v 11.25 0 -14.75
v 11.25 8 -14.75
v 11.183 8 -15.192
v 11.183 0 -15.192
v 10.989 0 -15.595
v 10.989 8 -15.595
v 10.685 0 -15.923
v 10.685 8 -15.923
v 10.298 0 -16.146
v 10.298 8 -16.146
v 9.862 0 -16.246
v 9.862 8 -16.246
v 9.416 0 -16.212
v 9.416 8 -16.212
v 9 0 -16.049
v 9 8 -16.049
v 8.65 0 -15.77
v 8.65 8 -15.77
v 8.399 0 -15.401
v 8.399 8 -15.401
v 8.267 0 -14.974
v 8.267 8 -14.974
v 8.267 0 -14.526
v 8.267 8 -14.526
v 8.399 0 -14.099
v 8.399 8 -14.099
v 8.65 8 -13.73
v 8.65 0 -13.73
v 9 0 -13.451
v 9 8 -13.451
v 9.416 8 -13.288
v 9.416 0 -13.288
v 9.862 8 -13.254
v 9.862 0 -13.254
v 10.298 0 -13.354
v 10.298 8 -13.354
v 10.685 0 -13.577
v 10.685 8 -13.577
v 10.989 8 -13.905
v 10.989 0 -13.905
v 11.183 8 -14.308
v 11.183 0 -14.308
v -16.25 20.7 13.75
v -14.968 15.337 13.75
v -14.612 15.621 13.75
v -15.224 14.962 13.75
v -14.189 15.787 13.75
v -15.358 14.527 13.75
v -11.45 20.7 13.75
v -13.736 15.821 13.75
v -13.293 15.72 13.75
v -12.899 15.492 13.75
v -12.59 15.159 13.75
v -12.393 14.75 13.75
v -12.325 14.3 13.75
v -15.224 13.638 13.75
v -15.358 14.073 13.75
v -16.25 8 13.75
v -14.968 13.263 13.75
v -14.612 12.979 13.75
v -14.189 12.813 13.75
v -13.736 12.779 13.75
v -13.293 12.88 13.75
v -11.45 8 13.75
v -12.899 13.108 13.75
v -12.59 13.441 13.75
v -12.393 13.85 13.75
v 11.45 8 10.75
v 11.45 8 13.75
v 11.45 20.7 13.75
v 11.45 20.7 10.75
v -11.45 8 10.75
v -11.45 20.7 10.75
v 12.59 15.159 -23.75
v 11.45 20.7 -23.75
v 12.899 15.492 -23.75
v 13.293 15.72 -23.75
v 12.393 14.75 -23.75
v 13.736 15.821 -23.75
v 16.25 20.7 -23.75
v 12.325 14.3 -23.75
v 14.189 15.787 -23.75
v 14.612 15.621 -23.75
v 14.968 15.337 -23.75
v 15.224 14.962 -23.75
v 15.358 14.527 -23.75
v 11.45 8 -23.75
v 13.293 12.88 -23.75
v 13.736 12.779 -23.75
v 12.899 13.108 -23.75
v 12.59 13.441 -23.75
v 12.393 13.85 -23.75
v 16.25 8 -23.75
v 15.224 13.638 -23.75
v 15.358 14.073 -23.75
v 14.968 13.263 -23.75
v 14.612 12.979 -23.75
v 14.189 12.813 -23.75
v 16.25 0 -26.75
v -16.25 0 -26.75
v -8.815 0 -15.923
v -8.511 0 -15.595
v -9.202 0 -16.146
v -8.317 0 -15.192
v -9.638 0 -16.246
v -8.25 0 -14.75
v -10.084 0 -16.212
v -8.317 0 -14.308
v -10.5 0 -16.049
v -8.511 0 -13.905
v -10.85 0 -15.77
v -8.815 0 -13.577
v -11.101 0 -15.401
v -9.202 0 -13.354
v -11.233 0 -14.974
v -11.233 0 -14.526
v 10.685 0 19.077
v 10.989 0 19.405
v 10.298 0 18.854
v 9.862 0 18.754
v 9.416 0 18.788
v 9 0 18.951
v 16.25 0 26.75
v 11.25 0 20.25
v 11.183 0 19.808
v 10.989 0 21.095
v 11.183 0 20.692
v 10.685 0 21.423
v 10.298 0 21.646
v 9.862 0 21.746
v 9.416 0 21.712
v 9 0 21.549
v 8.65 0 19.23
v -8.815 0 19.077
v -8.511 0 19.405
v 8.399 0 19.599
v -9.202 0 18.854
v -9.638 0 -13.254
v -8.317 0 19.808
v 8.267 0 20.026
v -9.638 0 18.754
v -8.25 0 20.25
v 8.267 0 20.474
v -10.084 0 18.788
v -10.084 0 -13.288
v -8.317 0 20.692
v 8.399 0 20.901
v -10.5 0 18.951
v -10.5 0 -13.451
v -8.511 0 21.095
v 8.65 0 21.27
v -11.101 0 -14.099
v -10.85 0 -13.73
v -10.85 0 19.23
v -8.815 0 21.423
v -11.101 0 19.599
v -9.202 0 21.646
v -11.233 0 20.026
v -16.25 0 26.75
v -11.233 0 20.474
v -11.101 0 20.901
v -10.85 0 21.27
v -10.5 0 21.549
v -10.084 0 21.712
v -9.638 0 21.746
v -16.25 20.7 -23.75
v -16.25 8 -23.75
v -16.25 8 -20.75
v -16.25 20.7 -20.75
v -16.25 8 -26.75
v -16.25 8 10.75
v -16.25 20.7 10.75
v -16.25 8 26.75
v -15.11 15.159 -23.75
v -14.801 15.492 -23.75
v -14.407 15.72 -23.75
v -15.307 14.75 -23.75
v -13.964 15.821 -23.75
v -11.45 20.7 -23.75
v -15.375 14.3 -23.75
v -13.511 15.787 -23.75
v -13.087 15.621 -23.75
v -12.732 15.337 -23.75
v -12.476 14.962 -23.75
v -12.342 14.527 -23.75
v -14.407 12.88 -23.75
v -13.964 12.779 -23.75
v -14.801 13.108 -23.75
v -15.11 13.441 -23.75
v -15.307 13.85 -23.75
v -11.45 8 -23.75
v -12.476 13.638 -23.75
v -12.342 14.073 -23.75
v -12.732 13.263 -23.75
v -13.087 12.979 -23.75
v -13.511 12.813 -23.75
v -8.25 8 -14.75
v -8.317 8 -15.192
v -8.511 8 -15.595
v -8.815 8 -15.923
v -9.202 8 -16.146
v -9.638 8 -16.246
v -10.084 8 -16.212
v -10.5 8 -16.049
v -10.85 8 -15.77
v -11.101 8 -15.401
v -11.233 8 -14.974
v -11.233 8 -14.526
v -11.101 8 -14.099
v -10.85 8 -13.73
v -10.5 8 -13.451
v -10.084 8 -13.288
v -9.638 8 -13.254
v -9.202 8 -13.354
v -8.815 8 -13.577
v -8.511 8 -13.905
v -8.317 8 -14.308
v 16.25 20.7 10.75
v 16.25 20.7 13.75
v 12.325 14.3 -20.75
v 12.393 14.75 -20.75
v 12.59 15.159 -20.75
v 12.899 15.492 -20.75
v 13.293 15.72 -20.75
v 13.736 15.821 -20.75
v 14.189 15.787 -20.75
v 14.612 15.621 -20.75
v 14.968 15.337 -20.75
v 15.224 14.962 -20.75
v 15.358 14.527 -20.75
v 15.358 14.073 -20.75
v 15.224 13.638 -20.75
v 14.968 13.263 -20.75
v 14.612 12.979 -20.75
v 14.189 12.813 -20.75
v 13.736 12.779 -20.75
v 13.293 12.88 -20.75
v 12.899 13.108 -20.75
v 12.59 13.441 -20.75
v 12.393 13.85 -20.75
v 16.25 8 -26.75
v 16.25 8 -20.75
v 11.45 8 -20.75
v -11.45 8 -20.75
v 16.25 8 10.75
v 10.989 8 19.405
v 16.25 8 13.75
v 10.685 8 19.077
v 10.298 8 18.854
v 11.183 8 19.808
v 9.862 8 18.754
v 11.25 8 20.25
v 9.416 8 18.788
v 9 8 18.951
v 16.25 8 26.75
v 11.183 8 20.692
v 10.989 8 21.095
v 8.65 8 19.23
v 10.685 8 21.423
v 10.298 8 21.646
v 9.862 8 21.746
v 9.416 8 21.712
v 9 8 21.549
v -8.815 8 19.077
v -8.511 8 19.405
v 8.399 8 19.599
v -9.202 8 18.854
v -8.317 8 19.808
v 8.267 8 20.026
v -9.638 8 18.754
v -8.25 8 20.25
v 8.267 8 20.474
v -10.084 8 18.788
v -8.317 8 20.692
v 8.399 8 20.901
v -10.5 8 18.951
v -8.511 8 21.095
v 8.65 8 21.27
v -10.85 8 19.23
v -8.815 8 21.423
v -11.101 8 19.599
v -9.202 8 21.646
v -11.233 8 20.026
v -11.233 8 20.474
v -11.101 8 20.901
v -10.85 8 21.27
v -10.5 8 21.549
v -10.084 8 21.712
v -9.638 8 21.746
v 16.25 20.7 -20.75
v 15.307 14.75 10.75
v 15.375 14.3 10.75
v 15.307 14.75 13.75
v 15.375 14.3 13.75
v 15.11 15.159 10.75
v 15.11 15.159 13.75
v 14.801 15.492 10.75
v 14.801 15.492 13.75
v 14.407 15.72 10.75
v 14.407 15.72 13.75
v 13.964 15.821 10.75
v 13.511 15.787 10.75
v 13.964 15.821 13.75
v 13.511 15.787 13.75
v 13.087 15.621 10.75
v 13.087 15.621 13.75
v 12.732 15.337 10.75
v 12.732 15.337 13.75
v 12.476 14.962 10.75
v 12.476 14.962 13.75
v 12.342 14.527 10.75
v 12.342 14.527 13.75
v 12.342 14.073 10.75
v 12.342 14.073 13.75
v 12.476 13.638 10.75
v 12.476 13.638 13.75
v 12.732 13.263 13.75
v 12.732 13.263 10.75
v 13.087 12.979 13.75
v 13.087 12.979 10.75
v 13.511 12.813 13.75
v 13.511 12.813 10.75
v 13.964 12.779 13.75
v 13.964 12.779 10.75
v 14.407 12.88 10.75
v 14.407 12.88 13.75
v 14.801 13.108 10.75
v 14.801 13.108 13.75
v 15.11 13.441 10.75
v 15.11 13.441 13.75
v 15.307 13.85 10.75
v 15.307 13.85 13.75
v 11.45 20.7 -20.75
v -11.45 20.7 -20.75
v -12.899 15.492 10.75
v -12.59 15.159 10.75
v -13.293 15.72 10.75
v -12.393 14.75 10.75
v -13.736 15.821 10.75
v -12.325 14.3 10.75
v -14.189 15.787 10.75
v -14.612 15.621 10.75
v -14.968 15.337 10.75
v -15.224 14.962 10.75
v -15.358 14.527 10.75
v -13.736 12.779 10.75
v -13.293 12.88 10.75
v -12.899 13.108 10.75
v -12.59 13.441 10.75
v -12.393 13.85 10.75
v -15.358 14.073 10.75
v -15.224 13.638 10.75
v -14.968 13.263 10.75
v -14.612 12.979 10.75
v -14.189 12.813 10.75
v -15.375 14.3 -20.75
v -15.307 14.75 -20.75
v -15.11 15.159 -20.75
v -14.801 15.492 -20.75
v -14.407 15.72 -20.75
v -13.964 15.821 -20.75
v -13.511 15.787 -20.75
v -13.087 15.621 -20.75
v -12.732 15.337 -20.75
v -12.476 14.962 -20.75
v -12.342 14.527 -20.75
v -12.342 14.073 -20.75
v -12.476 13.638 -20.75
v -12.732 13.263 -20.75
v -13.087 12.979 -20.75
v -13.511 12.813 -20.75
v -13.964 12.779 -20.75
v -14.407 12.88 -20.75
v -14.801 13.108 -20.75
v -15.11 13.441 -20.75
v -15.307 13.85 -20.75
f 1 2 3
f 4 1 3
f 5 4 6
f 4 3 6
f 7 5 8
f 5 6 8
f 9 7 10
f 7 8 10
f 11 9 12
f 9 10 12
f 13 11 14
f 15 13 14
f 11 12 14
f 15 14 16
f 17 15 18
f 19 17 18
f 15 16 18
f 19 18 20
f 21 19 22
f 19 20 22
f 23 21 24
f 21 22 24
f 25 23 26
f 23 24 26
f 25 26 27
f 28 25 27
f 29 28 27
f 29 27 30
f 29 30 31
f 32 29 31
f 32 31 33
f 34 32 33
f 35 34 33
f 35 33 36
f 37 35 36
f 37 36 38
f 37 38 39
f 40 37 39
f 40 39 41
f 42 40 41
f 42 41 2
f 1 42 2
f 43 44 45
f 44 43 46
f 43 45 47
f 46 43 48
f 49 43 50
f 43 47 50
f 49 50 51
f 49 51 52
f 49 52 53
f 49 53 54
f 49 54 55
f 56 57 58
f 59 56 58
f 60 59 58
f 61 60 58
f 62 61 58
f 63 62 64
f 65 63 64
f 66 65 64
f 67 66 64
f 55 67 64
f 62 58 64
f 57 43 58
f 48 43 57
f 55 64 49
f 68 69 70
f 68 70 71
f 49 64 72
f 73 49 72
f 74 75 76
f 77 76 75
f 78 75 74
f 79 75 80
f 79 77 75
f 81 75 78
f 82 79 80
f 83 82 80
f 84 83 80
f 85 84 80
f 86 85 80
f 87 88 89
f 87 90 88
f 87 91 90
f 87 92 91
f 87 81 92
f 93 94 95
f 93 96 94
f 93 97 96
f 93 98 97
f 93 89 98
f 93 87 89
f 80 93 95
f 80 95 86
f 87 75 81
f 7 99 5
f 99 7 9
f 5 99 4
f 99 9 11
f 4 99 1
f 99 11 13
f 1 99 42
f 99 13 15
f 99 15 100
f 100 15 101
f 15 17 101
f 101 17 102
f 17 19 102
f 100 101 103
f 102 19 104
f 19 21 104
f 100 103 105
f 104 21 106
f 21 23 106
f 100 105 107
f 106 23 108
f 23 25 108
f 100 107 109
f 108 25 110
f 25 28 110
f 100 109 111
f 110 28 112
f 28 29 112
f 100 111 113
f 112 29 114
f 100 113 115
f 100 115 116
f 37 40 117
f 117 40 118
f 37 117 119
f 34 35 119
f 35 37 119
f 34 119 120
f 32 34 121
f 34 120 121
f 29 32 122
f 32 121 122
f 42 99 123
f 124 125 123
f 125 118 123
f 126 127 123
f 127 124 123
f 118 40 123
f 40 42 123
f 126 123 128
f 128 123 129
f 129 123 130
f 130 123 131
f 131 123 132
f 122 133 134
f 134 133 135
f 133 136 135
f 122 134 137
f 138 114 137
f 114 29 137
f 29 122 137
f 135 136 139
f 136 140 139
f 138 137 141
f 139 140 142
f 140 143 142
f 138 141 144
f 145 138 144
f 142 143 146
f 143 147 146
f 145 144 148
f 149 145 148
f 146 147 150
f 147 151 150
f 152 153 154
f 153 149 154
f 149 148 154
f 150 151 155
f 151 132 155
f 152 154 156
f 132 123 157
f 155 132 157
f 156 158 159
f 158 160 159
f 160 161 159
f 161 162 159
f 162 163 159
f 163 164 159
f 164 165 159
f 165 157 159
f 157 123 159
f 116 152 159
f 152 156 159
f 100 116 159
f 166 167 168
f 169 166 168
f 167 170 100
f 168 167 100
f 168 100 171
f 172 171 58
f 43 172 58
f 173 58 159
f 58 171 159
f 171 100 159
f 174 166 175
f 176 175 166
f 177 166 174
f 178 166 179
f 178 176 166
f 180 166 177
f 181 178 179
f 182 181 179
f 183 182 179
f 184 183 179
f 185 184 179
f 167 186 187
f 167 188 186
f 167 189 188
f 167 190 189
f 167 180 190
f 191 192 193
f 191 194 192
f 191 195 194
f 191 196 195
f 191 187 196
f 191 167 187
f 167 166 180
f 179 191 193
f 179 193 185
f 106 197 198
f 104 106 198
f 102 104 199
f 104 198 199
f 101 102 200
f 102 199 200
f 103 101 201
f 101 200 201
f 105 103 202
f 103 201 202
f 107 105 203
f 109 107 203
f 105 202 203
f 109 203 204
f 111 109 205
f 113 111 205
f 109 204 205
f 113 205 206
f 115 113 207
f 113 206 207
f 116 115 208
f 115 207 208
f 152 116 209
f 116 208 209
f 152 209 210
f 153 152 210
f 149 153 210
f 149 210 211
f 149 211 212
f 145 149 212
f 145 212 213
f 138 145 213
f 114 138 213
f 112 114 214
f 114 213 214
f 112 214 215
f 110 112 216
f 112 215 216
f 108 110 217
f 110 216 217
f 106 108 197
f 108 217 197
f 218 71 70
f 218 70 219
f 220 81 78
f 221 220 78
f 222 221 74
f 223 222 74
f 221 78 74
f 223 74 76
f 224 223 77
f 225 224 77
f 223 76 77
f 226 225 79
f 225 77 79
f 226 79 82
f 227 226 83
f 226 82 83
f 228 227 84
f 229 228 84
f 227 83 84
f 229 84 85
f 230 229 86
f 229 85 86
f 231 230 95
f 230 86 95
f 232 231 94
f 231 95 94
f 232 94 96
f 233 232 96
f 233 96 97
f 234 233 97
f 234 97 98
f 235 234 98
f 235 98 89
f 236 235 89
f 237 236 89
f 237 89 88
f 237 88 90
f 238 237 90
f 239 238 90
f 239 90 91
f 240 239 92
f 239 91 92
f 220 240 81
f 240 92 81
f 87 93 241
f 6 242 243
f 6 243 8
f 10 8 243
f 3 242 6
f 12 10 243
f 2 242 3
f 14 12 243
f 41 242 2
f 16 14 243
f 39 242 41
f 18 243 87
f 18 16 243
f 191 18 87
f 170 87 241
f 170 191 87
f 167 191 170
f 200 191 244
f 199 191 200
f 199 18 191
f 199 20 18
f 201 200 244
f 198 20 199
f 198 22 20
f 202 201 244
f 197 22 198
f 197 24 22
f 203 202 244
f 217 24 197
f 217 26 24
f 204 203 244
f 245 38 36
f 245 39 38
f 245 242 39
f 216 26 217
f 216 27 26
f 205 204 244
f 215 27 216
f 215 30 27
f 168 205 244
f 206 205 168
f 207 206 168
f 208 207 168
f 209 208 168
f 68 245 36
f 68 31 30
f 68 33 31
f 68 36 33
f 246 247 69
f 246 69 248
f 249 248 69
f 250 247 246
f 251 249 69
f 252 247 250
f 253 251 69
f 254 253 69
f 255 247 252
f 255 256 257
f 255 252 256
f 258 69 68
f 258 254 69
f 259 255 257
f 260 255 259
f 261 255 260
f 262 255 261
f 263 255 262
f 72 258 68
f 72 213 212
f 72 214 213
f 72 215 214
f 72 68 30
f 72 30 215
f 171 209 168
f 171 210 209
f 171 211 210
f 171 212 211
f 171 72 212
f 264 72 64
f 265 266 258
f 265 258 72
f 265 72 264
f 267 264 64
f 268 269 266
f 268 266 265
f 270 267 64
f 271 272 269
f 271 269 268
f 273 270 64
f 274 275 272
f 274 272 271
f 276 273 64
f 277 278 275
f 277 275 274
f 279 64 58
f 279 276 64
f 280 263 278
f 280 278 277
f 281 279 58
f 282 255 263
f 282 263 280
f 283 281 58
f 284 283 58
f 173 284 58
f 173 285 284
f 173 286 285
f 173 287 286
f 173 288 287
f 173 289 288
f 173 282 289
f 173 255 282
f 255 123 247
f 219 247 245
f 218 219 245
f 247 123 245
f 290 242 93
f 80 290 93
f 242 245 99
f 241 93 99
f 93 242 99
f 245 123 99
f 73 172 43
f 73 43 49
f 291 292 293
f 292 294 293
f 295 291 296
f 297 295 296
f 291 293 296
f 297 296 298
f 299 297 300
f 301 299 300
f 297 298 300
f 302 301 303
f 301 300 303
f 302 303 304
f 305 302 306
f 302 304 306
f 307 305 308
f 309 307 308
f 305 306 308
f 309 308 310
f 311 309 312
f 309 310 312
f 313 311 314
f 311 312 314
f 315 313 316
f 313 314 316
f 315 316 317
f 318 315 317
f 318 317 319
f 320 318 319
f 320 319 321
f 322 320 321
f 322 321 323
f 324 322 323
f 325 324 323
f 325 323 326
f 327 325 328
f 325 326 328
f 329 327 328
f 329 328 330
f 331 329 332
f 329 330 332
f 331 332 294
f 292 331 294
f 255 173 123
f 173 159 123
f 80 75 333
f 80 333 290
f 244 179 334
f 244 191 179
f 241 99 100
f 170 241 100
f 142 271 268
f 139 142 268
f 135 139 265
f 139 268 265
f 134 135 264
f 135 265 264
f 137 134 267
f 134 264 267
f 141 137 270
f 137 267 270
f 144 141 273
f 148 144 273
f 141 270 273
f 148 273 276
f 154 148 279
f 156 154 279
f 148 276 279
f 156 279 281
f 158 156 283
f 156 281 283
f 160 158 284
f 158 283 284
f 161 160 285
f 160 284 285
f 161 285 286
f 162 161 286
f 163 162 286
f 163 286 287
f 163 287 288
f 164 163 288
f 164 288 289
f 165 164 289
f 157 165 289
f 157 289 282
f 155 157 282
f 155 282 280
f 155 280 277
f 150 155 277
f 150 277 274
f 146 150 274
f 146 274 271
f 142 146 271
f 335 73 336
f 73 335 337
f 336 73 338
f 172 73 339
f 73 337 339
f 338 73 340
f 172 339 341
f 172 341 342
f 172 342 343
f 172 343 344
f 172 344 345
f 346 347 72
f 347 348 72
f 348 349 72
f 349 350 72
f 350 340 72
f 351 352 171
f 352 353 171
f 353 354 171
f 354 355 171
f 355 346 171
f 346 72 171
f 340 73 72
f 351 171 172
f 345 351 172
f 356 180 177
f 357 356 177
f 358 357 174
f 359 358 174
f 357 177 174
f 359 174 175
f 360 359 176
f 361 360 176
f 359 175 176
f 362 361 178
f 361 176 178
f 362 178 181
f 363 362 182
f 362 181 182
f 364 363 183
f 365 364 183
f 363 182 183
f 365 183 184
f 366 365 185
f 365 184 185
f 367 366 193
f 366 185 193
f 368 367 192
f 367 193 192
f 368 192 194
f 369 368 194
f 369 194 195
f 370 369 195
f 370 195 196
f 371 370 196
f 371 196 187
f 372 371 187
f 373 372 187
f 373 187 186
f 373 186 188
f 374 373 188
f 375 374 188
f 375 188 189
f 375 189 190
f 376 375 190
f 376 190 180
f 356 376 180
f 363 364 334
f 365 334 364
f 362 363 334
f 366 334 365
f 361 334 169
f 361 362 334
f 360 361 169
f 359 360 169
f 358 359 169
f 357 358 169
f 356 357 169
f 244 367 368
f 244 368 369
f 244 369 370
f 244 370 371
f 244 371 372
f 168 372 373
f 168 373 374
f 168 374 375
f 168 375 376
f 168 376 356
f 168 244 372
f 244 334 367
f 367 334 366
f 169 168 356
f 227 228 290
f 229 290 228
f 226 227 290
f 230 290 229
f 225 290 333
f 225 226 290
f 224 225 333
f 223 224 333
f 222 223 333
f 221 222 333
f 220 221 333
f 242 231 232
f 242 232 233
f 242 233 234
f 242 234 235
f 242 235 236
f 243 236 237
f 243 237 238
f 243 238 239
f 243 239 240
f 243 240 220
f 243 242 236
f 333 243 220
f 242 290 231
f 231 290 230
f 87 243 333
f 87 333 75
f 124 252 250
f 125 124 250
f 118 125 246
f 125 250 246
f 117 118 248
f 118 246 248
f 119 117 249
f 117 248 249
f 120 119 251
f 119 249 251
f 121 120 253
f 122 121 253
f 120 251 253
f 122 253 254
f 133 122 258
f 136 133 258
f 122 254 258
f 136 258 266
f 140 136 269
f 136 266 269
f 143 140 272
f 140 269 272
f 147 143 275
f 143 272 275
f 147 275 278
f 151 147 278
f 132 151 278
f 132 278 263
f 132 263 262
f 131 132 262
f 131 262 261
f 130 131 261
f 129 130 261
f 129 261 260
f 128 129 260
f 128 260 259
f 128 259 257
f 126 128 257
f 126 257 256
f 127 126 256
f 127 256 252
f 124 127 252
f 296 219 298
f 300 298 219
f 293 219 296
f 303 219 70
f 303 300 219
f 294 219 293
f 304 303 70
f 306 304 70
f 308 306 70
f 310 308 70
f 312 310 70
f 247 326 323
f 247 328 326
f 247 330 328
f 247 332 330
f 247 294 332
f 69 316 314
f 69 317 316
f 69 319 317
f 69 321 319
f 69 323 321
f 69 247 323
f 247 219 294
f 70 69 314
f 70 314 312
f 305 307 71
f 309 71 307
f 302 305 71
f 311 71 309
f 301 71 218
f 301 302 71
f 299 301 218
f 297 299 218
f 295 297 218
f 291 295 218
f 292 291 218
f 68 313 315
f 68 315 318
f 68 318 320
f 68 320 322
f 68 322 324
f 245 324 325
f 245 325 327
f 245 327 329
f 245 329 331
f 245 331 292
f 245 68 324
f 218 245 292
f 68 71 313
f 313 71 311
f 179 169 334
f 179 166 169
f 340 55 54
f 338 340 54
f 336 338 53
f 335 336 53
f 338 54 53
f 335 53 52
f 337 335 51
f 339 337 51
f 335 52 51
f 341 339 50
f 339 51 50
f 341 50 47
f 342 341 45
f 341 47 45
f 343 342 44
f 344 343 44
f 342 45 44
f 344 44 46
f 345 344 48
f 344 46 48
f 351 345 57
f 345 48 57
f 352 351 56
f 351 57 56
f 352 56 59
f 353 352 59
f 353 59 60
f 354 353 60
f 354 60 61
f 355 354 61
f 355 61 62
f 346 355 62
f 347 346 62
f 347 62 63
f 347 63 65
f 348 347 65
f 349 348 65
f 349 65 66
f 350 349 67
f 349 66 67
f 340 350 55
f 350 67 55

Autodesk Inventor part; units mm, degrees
ref_plane "YZ Plane" through (0, 0, 0) normal (1, 0, 0) x (0, 1, 0)
ref_plane "XZ Plane" through (0, 0, 0) normal (0, 1, 0) x (-1, 0, 0)
ref_plane "XY Plane" through (0, 0, 0) normal (0, 0, 1) x (1, 0, 0)
sketch "Szkic1" plane through (0, 0, 0) normal (0, 1, 0) x (-1, 0, 0)
  line L0 (16.25, 26.75) -> (-16.25, 26.75)
  line L1 (-16.25, 26.75) -> (-16.25, -26.75)
  line L2 (-16.25, -26.75) -> (16.25, -26.75)
  line L3 (16.25, -26.75) -> (16.25, 26.75)
  point P0 (0, 0)
  point P1 (0, 0)
  point P2 (0, 26.75)
  dimension "d0" = 32.5
  dimension "d1" = 53.5
  dimension "d2" = 26.75
  dimension "d3" = 16.25
extrude "Wyciągnięcie proste1" add sketch "Szkic1" along normal blind 8
sketch "Szkic2" plane through (0, 8, 0) normal (0, 1, 0) x (1, 0, 0)
  line L0 (-16.25, -26.75) -> (16.25, -26.75) projected
  line L1 (-16.25, 26.75) -> (-16.25, -26.75) projected
  line L2 (16.25, -26.75) -> (16.25, 26.75) projected
  line L3 (-16.25, -13.75) -> (-11.45, -13.75)
  line L4 (-11.45, -13.75) -> (-11.45, -10.75)
  line L5 (-11.45, -10.75) -> (-16.25, -10.75)
  line L6 (-16.25, -10.75) -> (-16.25, -13.75)
  line L7 (16.25, -13.75) -> (11.45, -13.75)
  line L8 (11.45, -13.75) -> (11.45, -10.75)
  line L9 (11.45, -10.75) -> (16.25, -10.75)
  line L10 (16.25, -10.75) -> (16.25, -13.75)
  line L11 (-16.25, 23.75) -> (-11.45, 23.75)
  line L12 (-11.45, 23.75) -> (-11.45, 20.75)
  line L13 (-11.45, 20.75) -> (-16.25, 20.75)
  line L14 (-16.25, 20.75) -> (-16.25, 23.75)
  line L15 (16.25, 20.75) -> (11.45, 20.75)
  line L16 (11.45, 20.75) -> (11.45, 23.75)
  line L17 (11.45, 23.75) -> (16.25, 23.75)
  line L18 (16.25, 23.75) -> (16.25, 20.75)
  point P0 (0, 0)
  dimension "d7" = 4.8
  dimension "d8" = 3
  dimension "d9" = 4.8
  dimension "d10" = 3
  dimension "d11" = 4.8
  dimension "d12" = 3
  dimension "d13" = 4.8
  dimension "d14" = 3
  dimension "d15" = 13
  dimension "d16" = 13
  dimension "d17" = 3
  dimension "d18" = 3
extrude "Wyciągnięcie proste2" add sketch "Szkic2" along normal blind 12.7
sketch "Szkic3" plane through (-16.25, 8, 13.75) normal (0, 0, 1) x (1, 0, 0)
  circle A0 centre (2.4, 6.3) radius 1.525
  circle A1 centre (30.1, 6.3) radius 1.525
  line L0 (0, 0) -> (32.5, 0) projected
  line L1 (4.8, 0) -> (4.8, 12.7) projected
  line L2 (32.5, 0) -> (32.5, 12.7) projected
  point P0 (16.25, -8)
  dimension "d21" = 3.05
  dimension "d22" = 3.05
  dimension "d23" = 6.3
  dimension "d24" = 6.3
  dimension "d25" = 2.4
  dimension "d26" = 2.4
sketch "Szkic4" plane through (-16.25, 8, -20.75) normal (0, 0, 1) x (1, 0, 0)
  point P0 (16.25, -8)
sketch "Szkic5" plane through (-11.45, 8, -23.75) normal (0, 0, -1) x (-1, 0, 0)
  circle A0 centre (-25.3, 6.3) radius 1.525
  circle A1 centre (2.4, 6.3) radius 1.525
  line L0 (-27.7, 0) -> (4.8, 0) projected
  line L1 (-22.9, 0) -> (-22.9, 12.7) projected
  line L2 (4.8, 0) -> (4.8, 12.7) projected
  point P0 (-11.45, -8)
  dimension "d27" = 3.05
  dimension "d28" = 3.05
  dimension "d29" = 6.3
  dimension "d30" = 2.4
  dimension "d31" = 2.4
  dimension "d32" = 6.3
extrude "Wyciągnięcie proste3" cut sketch "Szkic3" against normal blind 3
extrude "Wyciągnięcie proste4" cut sketch "Szkic5" against normal blind 3
sketch "Szkic6" plane through (0, 8, 0) normal (0, 1, 0) x (1, 0, 0)
  circle A0 centre (-9.75, 14.75) radius 1.5
  line L0 (16.25, 26.75) -> (-16.25, 26.75) projected
  line L1 (-16.25, 20.75) -> (-16.25, -10.75) projected
  circle A1 centre (-9.75, -20.25) radius 1.5
  line L2 (0, 26.75) -> (0, -26.75)
  line L3 (-16.25, -26.75) -> (16.25, -26.75) projected
  circle A2 centre (9.75, 14.75) radius 1.5
  circle A3 centre (9.75, -20.25) radius 1.5
  point P0 (0, 0)
  dimension "d37" = 3
  dimension "d38" = 12
  dimension "d39" = 6.5
  dimension "d42" = 35
  dimension "d49" = 9.75
extrude "Wyciągnięcie proste5" cut sketch "Szkic6" against normal blind 10
properties part number "Base_to_servo_mount"
